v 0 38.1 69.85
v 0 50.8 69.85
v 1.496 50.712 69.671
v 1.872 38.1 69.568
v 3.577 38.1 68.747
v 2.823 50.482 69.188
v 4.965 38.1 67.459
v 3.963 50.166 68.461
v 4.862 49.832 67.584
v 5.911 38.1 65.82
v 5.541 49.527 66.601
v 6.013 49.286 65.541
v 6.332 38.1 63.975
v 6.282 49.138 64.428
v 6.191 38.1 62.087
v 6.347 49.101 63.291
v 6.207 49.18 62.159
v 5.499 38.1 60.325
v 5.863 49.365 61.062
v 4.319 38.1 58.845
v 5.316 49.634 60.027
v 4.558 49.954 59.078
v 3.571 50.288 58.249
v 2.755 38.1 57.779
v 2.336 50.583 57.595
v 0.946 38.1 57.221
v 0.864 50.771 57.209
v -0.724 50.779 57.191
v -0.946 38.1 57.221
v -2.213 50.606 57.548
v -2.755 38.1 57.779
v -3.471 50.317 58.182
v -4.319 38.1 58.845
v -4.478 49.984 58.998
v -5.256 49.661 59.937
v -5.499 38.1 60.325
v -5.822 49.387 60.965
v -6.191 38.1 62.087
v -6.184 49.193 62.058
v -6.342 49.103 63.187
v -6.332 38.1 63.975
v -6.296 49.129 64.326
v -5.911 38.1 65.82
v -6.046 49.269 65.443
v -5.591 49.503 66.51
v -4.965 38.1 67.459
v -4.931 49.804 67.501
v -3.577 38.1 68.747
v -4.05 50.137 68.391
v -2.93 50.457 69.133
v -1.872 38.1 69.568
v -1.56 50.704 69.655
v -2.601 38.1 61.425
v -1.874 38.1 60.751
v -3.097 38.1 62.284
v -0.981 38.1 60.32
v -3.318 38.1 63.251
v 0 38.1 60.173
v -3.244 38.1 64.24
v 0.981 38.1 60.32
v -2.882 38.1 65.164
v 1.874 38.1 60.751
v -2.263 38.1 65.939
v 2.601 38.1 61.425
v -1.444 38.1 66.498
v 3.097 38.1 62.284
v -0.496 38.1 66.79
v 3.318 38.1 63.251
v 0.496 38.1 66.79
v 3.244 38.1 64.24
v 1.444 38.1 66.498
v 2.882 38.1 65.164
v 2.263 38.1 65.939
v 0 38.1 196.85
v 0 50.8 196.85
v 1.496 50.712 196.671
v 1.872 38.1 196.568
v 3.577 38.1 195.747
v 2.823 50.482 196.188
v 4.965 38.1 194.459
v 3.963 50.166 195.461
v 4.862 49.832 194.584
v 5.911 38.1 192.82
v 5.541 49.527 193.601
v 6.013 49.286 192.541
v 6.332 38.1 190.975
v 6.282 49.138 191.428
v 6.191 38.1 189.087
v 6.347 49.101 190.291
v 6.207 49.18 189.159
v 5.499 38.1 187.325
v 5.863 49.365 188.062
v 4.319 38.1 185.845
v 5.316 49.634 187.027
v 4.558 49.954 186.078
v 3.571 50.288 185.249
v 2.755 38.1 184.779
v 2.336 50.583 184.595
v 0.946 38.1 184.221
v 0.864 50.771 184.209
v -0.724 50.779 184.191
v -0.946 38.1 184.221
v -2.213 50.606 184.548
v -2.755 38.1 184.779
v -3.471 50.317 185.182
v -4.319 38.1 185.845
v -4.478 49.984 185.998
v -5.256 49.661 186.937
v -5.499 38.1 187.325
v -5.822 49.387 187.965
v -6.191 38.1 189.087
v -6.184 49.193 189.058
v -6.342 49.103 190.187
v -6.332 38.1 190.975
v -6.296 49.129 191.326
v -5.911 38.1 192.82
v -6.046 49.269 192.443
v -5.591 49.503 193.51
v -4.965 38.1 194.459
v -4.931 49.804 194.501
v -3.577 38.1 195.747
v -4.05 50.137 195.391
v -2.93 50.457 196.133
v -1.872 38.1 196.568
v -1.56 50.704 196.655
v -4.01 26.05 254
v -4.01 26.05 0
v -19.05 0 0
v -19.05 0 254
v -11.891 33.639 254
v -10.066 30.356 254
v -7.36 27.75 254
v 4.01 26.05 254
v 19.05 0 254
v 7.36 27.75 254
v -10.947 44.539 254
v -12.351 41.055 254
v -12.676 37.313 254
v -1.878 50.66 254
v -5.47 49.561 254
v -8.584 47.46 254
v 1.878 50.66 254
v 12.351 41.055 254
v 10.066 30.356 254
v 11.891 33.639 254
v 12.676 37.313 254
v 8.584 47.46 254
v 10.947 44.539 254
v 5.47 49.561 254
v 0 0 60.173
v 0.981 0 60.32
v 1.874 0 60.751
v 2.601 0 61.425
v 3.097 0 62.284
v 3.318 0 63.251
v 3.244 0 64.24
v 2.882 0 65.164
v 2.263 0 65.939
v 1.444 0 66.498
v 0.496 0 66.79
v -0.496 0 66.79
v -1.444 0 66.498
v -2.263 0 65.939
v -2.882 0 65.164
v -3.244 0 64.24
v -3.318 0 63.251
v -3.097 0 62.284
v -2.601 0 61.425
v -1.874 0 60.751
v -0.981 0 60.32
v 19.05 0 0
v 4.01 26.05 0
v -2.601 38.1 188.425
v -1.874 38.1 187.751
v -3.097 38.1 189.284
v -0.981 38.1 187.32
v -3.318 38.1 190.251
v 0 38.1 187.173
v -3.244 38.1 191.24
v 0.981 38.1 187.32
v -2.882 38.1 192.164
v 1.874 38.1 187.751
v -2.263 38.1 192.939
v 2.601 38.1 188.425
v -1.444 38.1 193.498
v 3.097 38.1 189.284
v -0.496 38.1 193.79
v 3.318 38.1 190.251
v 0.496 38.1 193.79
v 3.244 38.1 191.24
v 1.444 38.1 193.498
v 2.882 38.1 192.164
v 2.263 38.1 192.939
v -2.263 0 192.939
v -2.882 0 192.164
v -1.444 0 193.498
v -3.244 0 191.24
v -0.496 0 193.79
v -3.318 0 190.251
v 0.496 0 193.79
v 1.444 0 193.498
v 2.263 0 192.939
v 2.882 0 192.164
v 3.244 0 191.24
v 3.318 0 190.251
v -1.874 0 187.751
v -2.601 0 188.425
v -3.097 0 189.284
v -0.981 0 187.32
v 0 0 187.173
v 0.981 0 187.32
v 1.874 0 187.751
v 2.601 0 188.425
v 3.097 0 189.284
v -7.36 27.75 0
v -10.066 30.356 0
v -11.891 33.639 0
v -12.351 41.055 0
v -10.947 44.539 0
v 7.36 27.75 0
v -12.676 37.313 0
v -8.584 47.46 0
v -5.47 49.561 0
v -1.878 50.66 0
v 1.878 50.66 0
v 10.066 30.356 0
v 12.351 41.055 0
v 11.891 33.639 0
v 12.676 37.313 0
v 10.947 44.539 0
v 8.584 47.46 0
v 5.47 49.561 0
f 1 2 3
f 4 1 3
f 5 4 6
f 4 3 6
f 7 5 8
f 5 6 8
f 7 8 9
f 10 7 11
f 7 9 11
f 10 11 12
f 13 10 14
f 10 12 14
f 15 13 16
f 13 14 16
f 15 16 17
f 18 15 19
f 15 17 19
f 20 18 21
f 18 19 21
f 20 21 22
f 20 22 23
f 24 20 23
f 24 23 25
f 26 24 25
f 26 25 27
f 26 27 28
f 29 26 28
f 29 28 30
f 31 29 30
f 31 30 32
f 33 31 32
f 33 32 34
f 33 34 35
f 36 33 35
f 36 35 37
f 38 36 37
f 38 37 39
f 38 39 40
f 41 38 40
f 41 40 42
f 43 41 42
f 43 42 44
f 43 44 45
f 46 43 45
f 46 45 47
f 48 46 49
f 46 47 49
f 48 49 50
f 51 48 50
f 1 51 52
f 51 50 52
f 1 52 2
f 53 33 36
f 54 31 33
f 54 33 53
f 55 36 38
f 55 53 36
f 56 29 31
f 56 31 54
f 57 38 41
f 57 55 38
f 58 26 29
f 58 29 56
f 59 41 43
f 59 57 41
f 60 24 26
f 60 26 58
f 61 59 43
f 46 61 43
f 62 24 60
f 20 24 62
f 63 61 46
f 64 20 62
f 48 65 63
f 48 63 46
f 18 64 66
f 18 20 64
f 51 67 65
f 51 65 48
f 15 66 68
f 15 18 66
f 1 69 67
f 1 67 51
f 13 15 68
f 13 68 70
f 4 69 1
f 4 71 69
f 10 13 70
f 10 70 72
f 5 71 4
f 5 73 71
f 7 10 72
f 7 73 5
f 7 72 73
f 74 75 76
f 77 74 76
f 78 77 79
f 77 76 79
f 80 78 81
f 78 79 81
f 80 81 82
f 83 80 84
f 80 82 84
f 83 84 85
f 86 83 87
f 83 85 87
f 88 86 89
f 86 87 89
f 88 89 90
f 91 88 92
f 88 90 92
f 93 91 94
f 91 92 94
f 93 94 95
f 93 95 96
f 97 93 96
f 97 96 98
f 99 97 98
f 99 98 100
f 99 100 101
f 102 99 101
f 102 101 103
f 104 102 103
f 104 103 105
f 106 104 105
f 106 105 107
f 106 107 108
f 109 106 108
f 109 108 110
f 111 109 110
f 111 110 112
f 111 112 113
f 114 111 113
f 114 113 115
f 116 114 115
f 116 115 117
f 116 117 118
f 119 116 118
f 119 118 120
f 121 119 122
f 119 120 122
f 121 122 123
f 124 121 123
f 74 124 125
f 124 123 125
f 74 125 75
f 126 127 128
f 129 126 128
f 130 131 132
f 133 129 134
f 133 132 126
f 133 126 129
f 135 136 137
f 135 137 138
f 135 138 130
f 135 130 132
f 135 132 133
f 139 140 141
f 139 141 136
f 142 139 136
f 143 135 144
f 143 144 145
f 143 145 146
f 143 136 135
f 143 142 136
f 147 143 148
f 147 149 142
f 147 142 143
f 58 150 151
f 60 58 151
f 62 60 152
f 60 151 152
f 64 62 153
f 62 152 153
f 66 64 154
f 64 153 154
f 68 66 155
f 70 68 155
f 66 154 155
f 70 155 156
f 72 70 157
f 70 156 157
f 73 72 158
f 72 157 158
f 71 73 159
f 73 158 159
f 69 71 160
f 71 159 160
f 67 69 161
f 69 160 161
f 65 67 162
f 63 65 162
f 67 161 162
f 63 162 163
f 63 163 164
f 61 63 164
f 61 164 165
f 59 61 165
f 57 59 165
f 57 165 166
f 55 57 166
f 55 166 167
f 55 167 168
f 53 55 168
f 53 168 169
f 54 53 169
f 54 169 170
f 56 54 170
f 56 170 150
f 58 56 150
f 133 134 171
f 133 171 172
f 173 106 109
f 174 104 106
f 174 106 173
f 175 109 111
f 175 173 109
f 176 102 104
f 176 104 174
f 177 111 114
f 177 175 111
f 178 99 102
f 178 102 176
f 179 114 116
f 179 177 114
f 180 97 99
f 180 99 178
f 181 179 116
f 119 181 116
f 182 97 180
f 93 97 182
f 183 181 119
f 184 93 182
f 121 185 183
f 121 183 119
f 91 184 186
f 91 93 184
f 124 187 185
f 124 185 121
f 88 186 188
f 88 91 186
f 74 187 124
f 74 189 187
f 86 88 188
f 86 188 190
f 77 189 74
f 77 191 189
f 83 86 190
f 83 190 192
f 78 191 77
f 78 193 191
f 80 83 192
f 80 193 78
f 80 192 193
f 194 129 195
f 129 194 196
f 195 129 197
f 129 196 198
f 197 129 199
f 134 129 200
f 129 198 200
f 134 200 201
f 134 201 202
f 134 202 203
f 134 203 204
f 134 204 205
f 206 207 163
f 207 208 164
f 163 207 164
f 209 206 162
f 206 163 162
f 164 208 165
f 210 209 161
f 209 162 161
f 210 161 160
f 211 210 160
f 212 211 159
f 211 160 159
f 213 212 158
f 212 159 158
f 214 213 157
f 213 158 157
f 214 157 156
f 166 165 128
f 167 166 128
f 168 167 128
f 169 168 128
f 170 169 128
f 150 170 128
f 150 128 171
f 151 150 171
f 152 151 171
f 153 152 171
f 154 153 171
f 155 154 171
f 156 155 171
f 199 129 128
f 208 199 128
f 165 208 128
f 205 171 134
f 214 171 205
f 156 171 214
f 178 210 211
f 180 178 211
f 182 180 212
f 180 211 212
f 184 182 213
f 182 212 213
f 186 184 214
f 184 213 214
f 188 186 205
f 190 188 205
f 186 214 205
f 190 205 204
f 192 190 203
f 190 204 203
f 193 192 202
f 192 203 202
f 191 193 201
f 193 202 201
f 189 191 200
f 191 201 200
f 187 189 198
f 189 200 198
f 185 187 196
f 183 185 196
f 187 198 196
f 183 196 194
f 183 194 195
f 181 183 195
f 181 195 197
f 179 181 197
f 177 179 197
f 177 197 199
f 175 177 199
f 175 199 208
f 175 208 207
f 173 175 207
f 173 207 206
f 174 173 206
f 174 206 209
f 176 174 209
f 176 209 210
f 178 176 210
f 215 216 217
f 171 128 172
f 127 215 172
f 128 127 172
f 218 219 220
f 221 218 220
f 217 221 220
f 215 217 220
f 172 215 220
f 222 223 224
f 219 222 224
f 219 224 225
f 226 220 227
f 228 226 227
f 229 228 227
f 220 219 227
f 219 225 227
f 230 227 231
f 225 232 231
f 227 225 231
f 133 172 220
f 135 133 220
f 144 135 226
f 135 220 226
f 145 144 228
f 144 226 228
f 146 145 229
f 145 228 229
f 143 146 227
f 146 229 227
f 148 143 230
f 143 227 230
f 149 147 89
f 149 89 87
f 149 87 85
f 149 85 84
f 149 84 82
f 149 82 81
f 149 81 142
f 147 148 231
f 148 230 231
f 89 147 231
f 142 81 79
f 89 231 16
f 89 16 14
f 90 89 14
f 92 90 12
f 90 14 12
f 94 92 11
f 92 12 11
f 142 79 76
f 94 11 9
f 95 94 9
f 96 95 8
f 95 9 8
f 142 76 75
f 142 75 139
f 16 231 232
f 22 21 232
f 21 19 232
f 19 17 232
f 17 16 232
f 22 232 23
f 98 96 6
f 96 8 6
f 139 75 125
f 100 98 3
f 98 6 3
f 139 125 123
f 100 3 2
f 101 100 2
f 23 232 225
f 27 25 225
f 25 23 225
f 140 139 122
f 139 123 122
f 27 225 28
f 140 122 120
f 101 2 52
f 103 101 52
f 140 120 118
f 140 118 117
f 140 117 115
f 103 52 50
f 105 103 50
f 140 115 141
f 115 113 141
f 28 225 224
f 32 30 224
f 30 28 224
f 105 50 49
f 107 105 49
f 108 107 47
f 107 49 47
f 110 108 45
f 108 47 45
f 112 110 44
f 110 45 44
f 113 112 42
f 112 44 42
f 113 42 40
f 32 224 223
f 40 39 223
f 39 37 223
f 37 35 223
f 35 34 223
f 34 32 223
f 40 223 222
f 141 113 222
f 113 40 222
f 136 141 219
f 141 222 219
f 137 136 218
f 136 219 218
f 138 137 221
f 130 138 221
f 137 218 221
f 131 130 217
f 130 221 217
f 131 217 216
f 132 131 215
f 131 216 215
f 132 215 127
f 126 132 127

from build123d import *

# Parameters (mm, degrees)
BOSS_EXTRUDE1_DEPTH = 254
SKETCH2_R           = 3.3274
CUT_EXTRUDE1_DEPTH  = 260.72974897
SKETCH3_R           = 6.35
CUT_EXTRUDE2_DEPTH  = 12.7


with BuildPart() as part:
    # Sketch1 → Boss-Extrude1 (new body)
    with BuildSketch(Plane.XY):
        with BuildLine():
            Line((-19.05, 0), (19.05, 0))
            Line((19.05, 0), (4.010170085, 26.049749551))
            ThreePointArc((4.010170085, 26.049749551), (0, 50.8), (-4.010170085, 26.049749551))
            Line((-4.010170085, 26.049749551), (-19.05, 0))
        make_face()
    extrude(amount=BOSS_EXTRUDE1_DEPTH)

    # Sketch2 → Cut-Extrude1 (cut, through all)
    with BuildSketch(Plane.XZ):
        with Locations(Location((0, 190.5, 0), (0, 0, 270))):
            Circle(SKETCH2_R)
        with Locations(Location((0, 63.5, 0), (0, 0, 270))):
            Circle(SKETCH2_R)
    extrude(amount=-CUT_EXTRUDE1_DEPTH, mode=Mode.SUBTRACT)

    # Sketch3 → Cut-Extrude2 (cut)
    with BuildSketch(Plane(origin=(0, 50.8, 0), x_dir=(1, 0, 0), z_dir=(0, 1, 0))):
        with Locations(Location((0, -63.5, 0), (0, 0, 270))):
            Circle(SKETCH3_R)
        with Locations(Location((0, -190.5, 0), (0, 0, 270))):
            Circle(SKETCH3_R)
    extrude(amount=-CUT_EXTRUDE2_DEPTH, mode=Mode.SUBTRACT)


solid = part.part
